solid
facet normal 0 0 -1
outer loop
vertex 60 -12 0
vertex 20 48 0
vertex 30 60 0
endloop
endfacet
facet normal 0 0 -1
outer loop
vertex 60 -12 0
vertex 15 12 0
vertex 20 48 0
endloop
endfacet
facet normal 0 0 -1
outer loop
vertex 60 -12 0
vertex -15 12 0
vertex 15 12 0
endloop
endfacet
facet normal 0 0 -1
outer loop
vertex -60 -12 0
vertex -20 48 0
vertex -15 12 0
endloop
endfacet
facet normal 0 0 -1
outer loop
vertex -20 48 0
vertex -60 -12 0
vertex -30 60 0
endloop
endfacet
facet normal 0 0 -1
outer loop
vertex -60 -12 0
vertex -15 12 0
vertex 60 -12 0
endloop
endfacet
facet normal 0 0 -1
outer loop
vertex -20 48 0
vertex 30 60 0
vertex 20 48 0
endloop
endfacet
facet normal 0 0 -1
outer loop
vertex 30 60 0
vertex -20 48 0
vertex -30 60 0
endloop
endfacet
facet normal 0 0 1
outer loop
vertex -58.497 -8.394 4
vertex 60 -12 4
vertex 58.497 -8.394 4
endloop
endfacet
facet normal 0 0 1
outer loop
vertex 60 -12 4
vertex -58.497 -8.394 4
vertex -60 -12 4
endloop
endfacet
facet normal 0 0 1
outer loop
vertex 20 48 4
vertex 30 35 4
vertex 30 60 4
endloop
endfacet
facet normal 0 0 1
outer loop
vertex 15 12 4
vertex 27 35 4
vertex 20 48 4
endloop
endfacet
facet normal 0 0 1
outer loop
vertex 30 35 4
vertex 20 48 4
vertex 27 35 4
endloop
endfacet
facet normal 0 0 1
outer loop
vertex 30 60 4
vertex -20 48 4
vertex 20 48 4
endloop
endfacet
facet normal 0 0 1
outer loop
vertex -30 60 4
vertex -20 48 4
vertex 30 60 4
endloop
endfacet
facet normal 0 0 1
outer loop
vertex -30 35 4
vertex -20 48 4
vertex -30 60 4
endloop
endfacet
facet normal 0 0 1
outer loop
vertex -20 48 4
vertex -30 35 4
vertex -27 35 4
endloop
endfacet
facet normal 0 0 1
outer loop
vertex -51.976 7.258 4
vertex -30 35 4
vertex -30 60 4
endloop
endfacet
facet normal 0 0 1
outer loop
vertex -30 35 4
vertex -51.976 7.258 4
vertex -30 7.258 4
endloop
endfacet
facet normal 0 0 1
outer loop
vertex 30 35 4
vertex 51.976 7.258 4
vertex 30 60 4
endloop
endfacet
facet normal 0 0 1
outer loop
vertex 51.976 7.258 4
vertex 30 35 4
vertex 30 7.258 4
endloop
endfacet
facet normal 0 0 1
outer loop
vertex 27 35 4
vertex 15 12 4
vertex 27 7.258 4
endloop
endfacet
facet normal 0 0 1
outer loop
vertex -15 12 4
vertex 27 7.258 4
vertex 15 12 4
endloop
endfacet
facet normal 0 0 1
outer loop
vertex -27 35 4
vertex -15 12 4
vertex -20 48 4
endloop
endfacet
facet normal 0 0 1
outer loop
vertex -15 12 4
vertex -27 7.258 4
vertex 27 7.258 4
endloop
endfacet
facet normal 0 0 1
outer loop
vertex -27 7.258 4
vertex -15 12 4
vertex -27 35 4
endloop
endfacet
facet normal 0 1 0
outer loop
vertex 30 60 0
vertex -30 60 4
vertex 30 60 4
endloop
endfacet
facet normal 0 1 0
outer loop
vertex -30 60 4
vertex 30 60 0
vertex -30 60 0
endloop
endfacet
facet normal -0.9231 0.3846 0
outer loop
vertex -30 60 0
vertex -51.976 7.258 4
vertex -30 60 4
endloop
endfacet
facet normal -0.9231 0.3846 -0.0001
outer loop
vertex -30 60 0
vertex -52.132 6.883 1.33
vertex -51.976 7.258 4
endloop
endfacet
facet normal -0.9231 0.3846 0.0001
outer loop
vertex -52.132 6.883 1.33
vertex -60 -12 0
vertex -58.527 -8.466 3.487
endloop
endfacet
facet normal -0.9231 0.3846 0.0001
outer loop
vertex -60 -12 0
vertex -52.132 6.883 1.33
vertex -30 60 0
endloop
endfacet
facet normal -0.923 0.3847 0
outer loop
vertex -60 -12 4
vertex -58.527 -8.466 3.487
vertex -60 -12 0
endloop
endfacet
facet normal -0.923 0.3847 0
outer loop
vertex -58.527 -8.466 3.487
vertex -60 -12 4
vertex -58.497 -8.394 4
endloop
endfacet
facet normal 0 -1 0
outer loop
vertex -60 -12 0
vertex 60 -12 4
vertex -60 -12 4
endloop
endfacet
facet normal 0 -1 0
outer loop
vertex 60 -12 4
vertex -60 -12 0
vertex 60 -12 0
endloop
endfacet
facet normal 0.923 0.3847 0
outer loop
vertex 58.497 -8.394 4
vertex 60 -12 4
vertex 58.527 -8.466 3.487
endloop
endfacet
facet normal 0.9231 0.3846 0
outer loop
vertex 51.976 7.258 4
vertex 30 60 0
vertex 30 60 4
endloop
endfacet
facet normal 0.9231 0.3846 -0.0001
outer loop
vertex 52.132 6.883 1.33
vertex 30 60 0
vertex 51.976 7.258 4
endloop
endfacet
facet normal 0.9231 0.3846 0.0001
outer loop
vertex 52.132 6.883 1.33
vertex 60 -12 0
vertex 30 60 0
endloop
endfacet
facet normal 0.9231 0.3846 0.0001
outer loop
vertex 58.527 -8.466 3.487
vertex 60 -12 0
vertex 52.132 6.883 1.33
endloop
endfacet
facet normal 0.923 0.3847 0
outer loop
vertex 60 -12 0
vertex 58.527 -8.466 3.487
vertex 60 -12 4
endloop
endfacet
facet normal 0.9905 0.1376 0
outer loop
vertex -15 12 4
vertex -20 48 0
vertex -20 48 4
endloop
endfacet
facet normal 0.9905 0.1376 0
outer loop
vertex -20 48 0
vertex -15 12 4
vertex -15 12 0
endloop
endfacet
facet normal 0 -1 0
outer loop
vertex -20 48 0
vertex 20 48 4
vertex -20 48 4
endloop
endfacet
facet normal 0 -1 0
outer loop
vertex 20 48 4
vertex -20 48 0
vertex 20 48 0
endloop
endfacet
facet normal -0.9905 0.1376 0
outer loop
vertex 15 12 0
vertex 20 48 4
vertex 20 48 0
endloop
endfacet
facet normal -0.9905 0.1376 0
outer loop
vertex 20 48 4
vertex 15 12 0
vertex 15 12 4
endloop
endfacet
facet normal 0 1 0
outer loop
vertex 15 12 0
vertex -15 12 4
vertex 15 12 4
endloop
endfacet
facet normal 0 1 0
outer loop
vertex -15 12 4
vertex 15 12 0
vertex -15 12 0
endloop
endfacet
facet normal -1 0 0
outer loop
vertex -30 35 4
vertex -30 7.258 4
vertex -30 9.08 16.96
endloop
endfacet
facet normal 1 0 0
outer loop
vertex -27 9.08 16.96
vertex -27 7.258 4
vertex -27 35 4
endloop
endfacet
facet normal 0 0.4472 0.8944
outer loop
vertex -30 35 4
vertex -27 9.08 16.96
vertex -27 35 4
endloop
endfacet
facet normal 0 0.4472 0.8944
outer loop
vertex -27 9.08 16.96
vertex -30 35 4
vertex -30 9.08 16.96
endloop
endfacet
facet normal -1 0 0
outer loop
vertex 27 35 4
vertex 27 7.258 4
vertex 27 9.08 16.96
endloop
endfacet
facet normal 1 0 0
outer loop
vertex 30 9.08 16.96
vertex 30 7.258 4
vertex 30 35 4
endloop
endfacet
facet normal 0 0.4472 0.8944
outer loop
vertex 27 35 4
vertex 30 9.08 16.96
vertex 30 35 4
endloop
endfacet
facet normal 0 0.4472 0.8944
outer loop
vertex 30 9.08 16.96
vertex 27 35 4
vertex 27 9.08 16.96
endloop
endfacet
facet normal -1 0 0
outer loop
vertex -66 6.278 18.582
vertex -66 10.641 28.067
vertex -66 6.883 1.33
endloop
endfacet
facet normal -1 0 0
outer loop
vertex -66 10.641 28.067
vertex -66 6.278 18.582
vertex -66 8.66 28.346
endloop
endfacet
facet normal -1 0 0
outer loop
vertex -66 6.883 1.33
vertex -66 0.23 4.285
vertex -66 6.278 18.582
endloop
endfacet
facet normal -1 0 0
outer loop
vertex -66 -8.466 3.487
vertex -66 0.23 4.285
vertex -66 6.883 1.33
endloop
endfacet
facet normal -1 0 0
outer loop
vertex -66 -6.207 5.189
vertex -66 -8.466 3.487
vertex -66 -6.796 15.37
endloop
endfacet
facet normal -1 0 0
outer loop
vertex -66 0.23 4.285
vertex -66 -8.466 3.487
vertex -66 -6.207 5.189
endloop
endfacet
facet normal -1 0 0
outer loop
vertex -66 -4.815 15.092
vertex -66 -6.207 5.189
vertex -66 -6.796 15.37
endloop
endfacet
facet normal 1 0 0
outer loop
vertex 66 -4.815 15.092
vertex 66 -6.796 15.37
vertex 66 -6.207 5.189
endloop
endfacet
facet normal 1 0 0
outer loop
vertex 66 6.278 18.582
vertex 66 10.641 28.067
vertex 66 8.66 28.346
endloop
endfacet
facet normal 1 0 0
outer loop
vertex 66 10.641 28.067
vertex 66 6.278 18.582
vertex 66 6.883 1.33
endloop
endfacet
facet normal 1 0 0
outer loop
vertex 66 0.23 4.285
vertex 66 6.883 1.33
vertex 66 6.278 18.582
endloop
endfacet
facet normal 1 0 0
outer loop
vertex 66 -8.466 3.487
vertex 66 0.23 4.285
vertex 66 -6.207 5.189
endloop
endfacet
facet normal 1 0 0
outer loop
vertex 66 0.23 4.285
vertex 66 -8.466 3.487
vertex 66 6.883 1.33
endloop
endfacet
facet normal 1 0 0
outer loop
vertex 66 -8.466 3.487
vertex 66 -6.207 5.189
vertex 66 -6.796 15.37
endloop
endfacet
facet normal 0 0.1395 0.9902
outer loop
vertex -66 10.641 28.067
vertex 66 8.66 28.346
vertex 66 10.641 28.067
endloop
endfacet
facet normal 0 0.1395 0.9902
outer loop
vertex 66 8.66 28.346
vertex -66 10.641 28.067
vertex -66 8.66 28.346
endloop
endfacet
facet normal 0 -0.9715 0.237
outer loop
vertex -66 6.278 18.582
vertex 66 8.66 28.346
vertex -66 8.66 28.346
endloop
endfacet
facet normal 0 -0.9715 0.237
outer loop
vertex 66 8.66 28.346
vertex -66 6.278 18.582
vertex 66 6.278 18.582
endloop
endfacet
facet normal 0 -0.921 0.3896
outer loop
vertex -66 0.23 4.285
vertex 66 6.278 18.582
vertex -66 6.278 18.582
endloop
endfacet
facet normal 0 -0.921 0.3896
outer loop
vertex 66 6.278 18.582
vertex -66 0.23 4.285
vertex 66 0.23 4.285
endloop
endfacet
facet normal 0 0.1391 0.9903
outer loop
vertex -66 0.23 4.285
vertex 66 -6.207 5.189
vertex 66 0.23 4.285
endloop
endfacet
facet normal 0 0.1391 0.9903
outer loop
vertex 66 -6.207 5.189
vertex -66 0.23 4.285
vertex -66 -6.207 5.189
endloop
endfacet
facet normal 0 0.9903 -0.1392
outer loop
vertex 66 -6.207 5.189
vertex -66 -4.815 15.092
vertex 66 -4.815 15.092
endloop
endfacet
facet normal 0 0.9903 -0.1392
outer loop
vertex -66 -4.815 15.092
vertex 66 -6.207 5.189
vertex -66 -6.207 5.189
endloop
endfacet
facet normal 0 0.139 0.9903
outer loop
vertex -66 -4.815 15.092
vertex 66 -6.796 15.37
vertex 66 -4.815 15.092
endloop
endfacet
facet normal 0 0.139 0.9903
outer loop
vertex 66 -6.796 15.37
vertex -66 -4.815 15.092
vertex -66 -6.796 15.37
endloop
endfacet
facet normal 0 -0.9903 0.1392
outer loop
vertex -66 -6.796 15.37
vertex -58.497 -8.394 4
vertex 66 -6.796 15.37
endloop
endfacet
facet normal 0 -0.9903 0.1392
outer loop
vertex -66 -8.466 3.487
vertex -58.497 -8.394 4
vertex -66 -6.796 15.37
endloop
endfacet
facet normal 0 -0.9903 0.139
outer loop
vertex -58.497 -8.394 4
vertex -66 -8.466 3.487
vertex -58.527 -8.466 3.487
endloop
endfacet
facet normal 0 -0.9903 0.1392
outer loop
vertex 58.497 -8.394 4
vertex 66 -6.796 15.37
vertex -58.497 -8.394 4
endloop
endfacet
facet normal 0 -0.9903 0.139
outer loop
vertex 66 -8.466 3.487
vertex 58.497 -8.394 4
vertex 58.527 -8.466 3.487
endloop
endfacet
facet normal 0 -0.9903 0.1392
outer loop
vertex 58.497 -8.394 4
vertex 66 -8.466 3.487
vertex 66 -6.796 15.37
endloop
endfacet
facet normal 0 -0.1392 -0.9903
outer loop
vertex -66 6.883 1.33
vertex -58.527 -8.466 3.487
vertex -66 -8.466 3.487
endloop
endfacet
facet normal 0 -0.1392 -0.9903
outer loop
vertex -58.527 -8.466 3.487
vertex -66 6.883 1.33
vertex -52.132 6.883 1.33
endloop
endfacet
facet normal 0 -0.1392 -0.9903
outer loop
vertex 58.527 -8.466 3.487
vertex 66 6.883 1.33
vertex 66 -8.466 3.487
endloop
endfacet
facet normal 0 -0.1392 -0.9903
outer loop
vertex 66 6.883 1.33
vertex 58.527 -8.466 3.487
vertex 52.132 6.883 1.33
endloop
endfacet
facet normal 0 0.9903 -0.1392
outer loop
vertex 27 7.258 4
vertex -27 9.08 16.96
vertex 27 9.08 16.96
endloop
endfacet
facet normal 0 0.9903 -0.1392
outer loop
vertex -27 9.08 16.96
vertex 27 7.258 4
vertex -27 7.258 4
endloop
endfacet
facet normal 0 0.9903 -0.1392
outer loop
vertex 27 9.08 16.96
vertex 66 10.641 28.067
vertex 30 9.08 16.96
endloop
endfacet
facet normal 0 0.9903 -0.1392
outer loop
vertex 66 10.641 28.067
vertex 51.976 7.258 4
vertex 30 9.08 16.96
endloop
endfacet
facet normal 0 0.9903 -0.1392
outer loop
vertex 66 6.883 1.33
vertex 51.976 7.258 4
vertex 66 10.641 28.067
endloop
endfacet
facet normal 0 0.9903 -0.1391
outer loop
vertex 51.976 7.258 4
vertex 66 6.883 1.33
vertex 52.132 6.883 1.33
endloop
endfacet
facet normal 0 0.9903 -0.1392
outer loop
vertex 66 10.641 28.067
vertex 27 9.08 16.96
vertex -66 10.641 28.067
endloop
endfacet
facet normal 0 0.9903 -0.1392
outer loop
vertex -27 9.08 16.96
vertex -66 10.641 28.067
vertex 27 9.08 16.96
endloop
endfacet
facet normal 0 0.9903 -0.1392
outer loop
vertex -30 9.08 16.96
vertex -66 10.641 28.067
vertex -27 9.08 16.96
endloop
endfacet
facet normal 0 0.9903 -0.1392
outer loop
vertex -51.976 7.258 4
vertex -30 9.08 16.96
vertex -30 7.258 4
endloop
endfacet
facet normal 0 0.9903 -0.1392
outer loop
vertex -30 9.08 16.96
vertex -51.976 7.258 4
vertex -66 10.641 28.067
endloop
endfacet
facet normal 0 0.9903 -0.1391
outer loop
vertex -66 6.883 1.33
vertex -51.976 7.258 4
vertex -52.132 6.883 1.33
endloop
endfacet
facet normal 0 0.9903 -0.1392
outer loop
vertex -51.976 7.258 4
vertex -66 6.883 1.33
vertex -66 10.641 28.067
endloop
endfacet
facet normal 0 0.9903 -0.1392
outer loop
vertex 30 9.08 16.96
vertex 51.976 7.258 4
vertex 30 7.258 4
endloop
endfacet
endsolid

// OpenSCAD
s = 60;
t = 12;

module base() {
    linear_extrude(height = 4)
      polygon(
        [[-s,-12], [-15,t],
        [s,-12],   [15,t],
        [s/2,s],  [20,s-t],
        [-s/2,s], [-20,s-t]],
        paths=[[0,2,4,6], [1,3,5,7]]);
    translate([-30,7,3])
      brace();
    translate([30-3,7,3])
      brace();
}

module brace() {
  rotate([90,0,90])
    linear_extrude(height = 3)
      polygon([[0,0],[30,0],[0,15],[0,0]]);
}

module clamp(s) {
  w = 5; h = 25;
  *translate([15,13,18])
    sphere(3,true,$fn=20);
  *translate([-15,13,18])
    sphere(3,true,$fn=20);
  translate([-s,0,2])
  rotate([90,0,90])
    linear_extrude(height = 2*s)
      polygon(
        [[0,0],[w,0],[w+4,15],[w+5,h],
        [w+7,h],[w+7,-2],[-3.5,-2],[-3.5,10],
        [-1.5,10],[-1.5,0],[0,0]]);
}
      
base();
translate([0,-5,3])
  rotate([-8,0,0])
    clamp(1.1*s);
